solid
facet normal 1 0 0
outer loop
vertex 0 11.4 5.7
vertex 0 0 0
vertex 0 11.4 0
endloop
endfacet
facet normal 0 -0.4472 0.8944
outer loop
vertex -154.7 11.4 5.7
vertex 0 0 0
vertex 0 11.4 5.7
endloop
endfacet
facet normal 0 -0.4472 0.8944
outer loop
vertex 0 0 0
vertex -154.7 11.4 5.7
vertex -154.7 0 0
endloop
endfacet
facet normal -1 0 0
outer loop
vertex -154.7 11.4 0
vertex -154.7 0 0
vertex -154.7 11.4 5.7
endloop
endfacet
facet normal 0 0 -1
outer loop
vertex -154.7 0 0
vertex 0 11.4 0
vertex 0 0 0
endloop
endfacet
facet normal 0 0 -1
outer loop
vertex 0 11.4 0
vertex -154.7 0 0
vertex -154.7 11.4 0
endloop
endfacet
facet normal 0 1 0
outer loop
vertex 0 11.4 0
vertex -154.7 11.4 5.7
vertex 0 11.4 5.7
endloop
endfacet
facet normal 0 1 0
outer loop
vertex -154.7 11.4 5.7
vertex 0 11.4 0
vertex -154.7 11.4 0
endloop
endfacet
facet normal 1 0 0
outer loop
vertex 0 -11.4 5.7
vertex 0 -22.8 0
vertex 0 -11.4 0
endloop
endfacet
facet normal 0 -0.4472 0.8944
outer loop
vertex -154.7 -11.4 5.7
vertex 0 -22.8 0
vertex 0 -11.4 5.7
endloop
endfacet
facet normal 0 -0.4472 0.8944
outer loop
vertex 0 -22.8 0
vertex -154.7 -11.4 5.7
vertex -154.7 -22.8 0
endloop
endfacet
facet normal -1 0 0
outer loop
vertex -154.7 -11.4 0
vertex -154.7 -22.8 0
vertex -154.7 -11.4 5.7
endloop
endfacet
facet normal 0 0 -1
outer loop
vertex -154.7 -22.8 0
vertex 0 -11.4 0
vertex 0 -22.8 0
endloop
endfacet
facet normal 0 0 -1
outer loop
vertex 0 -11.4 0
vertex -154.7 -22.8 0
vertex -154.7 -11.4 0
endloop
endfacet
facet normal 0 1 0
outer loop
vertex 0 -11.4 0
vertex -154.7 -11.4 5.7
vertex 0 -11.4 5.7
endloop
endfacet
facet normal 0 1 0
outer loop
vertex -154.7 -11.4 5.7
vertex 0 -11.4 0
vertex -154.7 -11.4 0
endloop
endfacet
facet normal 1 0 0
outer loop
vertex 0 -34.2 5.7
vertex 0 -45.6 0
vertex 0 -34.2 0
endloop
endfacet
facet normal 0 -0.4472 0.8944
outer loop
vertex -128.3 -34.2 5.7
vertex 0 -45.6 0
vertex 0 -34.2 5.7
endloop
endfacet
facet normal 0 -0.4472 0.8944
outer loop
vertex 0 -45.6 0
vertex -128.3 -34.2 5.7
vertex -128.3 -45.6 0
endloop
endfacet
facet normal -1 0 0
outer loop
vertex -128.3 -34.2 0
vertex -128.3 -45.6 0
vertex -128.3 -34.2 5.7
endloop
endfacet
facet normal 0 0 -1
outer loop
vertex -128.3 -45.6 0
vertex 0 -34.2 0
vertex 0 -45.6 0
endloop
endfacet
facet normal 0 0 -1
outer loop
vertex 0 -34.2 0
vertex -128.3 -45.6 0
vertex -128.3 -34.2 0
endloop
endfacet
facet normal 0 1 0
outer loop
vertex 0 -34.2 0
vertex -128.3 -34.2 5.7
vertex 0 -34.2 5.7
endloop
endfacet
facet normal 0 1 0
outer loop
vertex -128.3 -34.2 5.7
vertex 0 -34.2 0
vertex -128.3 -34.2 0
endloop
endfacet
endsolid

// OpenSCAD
// Pebble Base Ramps

base_h = 5.7;
base_len = 154.7;
base_wid = 128.3;
ramp_base_dist = base_h*2;

module rampSegment2D() {
    polygon([
        [0, 0],
        [0, ramp_base_dist],
        [base_h, ramp_base_dist]
    ]);
}
rotate([0,-90,0])
linear_extrude(base_len)
rampSegment2D();

translate([0,-ramp_base_dist*2,0])
rotate([0,-90,0])
linear_extrude(base_len)
rampSegment2D();

translate([0,-ramp_base_dist*4,0])
rotate([0,-90,0])
linear_extrude(base_wid)
rampSegment2D();
